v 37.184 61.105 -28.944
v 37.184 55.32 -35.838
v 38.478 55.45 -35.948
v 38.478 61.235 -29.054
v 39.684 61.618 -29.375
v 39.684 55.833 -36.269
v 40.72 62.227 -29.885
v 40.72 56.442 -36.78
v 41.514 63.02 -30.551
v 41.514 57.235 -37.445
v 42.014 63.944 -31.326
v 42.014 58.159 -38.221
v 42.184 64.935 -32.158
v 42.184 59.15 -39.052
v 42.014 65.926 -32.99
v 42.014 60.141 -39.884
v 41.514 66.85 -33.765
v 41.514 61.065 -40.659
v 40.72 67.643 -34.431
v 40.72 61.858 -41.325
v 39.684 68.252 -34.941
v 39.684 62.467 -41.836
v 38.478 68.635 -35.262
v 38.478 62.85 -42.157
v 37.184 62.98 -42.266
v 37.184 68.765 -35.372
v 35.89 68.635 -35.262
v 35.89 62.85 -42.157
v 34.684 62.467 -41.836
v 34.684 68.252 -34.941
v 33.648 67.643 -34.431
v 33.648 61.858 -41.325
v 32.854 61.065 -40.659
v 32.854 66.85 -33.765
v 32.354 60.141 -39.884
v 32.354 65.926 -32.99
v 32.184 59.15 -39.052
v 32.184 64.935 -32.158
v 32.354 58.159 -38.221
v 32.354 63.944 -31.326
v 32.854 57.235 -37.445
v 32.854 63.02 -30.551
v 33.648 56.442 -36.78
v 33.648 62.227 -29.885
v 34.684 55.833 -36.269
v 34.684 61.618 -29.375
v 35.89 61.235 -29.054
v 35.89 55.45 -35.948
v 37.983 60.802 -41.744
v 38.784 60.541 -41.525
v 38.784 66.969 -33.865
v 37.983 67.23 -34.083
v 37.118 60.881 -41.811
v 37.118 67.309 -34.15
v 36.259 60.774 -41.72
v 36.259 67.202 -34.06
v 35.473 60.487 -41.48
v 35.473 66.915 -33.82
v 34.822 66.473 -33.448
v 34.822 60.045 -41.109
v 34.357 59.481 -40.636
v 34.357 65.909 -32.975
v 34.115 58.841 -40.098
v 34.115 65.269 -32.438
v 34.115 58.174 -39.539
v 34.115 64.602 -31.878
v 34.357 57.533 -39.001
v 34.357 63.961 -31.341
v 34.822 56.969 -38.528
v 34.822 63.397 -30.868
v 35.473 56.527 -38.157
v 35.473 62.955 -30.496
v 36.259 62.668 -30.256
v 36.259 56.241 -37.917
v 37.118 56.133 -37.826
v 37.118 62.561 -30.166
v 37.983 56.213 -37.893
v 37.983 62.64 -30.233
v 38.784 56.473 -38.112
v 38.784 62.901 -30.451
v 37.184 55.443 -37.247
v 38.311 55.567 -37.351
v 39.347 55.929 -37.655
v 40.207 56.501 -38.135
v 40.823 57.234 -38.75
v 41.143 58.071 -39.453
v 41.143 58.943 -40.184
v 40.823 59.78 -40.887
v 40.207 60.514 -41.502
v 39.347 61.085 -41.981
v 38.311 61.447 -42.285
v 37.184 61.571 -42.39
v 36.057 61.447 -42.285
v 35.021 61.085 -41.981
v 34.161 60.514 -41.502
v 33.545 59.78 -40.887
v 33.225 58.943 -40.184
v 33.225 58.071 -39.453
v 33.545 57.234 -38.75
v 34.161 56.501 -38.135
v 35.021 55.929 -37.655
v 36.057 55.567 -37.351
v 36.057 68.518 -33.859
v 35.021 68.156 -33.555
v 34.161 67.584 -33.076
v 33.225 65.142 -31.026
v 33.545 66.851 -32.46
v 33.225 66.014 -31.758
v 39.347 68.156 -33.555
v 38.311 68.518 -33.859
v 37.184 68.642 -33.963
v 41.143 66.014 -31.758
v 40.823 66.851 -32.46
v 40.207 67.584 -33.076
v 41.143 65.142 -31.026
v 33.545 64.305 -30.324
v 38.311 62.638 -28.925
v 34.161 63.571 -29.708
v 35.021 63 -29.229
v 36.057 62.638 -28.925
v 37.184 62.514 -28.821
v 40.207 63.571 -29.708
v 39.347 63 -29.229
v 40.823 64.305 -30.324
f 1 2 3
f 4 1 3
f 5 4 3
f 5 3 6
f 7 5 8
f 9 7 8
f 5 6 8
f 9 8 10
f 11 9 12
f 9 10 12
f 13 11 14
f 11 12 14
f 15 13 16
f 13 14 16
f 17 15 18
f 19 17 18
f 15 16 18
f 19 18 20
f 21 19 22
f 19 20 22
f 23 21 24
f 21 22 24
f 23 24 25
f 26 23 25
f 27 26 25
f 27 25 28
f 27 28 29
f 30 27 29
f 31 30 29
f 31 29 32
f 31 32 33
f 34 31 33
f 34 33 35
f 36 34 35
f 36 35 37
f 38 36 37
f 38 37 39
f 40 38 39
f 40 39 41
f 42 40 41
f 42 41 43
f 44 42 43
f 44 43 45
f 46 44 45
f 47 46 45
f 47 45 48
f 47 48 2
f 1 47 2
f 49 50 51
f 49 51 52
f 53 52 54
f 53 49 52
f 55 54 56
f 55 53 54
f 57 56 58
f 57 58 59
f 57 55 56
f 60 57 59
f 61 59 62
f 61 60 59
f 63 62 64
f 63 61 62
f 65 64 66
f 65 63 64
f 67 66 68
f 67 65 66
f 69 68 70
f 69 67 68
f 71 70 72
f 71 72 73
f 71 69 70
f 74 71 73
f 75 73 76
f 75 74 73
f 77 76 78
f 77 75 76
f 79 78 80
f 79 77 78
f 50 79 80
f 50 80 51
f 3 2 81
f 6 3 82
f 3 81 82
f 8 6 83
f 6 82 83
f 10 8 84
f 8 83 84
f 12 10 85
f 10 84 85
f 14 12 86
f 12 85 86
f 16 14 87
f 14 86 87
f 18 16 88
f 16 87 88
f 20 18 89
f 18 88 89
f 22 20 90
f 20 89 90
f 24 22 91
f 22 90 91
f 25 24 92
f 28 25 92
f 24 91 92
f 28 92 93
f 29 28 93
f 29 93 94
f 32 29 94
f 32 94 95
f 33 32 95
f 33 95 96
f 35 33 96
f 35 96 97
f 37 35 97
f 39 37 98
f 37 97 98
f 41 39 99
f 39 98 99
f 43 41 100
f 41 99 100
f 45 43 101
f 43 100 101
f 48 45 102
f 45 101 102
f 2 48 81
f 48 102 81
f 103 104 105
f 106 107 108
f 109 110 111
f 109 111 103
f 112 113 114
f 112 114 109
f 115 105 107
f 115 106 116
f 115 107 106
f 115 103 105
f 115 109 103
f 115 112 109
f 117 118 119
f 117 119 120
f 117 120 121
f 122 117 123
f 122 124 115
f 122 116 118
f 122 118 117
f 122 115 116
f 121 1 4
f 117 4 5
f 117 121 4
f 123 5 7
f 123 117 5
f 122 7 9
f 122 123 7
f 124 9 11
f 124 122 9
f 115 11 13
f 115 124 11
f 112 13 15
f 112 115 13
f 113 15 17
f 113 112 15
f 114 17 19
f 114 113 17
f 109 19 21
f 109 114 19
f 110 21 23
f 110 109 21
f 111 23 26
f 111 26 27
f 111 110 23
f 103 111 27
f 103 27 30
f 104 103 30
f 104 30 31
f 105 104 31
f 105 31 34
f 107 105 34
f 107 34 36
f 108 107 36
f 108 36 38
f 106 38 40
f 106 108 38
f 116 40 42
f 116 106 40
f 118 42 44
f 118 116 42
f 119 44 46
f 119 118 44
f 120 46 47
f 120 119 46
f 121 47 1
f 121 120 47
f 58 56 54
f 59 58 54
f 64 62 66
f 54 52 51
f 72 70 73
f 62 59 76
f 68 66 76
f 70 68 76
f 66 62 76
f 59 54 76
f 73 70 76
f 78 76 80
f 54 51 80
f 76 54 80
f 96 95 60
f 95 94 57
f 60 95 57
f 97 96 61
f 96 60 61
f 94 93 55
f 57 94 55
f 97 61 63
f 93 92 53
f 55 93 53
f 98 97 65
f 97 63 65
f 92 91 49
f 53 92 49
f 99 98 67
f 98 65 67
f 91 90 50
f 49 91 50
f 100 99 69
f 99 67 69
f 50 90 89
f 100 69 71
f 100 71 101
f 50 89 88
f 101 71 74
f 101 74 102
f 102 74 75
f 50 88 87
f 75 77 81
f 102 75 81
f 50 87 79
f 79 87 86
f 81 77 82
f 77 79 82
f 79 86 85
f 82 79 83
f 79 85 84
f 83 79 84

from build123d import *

# Parameters (mm, degrees)
SKETCH2_R           = 5
BOSS_EXTRUDE1_DEPTH = 10
SKETCH3_R           = 5
BOSS_EXTRUDE2_DEPTH = 1
CHAMFER1_SIZE       = 1


with BuildPart() as part:
    # Sketch2 → Boss-Extrude1 (new body)
    with BuildSketch(Plane(origin=(0, 4.567005967, 5.442745768), x_dir=(1, 0, 0), z_dir=(0, 0.6427876096865435, 0.7660444431189747))):
        with Locations(Location((37.184001138, 70.413914347, 0), (0, 0, 270))):
            Circle(SKETCH2_R)
        with BuildLine():
            Line((38.784001138, 67.758730476), (38.784001138, 73.069098218))
            ThreePointArc((38.784001138, 73.069098218), (34.084000914, 70.413914347), (38.784001138, 67.758730476))
        make_face(mode=Mode.SUBTRACT)
    extrude(amount=BOSS_EXTRUDE1_DEPTH)

    # Sketch3 → Boss-Extrude2 (add)
    with BuildSketch(Plane(origin=(0, 10.994882064, 13.1031902), x_dir=(1, 0, 0), z_dir=(0, 0.6427876096865434, 0.7660444431189747))):
        with Locations(Location((37.184001138, 70.413914347, 0), (0, 0, 270))):
            Circle(SKETCH3_R)
    extrude(amount=BOSS_EXTRUDE2_DEPTH)

    # Chamfer1
    chamfer1_edges = [part.edges().sort_by_distance(p)[0] for p in [
        (37.184001138, 69.408079693, -34.605895097),
        (37.184001138, 62.337415986, -43.032383972),
    ]]
    chamfer(chamfer1_edges, length=CHAMFER1_SIZE)


solid = part.part
